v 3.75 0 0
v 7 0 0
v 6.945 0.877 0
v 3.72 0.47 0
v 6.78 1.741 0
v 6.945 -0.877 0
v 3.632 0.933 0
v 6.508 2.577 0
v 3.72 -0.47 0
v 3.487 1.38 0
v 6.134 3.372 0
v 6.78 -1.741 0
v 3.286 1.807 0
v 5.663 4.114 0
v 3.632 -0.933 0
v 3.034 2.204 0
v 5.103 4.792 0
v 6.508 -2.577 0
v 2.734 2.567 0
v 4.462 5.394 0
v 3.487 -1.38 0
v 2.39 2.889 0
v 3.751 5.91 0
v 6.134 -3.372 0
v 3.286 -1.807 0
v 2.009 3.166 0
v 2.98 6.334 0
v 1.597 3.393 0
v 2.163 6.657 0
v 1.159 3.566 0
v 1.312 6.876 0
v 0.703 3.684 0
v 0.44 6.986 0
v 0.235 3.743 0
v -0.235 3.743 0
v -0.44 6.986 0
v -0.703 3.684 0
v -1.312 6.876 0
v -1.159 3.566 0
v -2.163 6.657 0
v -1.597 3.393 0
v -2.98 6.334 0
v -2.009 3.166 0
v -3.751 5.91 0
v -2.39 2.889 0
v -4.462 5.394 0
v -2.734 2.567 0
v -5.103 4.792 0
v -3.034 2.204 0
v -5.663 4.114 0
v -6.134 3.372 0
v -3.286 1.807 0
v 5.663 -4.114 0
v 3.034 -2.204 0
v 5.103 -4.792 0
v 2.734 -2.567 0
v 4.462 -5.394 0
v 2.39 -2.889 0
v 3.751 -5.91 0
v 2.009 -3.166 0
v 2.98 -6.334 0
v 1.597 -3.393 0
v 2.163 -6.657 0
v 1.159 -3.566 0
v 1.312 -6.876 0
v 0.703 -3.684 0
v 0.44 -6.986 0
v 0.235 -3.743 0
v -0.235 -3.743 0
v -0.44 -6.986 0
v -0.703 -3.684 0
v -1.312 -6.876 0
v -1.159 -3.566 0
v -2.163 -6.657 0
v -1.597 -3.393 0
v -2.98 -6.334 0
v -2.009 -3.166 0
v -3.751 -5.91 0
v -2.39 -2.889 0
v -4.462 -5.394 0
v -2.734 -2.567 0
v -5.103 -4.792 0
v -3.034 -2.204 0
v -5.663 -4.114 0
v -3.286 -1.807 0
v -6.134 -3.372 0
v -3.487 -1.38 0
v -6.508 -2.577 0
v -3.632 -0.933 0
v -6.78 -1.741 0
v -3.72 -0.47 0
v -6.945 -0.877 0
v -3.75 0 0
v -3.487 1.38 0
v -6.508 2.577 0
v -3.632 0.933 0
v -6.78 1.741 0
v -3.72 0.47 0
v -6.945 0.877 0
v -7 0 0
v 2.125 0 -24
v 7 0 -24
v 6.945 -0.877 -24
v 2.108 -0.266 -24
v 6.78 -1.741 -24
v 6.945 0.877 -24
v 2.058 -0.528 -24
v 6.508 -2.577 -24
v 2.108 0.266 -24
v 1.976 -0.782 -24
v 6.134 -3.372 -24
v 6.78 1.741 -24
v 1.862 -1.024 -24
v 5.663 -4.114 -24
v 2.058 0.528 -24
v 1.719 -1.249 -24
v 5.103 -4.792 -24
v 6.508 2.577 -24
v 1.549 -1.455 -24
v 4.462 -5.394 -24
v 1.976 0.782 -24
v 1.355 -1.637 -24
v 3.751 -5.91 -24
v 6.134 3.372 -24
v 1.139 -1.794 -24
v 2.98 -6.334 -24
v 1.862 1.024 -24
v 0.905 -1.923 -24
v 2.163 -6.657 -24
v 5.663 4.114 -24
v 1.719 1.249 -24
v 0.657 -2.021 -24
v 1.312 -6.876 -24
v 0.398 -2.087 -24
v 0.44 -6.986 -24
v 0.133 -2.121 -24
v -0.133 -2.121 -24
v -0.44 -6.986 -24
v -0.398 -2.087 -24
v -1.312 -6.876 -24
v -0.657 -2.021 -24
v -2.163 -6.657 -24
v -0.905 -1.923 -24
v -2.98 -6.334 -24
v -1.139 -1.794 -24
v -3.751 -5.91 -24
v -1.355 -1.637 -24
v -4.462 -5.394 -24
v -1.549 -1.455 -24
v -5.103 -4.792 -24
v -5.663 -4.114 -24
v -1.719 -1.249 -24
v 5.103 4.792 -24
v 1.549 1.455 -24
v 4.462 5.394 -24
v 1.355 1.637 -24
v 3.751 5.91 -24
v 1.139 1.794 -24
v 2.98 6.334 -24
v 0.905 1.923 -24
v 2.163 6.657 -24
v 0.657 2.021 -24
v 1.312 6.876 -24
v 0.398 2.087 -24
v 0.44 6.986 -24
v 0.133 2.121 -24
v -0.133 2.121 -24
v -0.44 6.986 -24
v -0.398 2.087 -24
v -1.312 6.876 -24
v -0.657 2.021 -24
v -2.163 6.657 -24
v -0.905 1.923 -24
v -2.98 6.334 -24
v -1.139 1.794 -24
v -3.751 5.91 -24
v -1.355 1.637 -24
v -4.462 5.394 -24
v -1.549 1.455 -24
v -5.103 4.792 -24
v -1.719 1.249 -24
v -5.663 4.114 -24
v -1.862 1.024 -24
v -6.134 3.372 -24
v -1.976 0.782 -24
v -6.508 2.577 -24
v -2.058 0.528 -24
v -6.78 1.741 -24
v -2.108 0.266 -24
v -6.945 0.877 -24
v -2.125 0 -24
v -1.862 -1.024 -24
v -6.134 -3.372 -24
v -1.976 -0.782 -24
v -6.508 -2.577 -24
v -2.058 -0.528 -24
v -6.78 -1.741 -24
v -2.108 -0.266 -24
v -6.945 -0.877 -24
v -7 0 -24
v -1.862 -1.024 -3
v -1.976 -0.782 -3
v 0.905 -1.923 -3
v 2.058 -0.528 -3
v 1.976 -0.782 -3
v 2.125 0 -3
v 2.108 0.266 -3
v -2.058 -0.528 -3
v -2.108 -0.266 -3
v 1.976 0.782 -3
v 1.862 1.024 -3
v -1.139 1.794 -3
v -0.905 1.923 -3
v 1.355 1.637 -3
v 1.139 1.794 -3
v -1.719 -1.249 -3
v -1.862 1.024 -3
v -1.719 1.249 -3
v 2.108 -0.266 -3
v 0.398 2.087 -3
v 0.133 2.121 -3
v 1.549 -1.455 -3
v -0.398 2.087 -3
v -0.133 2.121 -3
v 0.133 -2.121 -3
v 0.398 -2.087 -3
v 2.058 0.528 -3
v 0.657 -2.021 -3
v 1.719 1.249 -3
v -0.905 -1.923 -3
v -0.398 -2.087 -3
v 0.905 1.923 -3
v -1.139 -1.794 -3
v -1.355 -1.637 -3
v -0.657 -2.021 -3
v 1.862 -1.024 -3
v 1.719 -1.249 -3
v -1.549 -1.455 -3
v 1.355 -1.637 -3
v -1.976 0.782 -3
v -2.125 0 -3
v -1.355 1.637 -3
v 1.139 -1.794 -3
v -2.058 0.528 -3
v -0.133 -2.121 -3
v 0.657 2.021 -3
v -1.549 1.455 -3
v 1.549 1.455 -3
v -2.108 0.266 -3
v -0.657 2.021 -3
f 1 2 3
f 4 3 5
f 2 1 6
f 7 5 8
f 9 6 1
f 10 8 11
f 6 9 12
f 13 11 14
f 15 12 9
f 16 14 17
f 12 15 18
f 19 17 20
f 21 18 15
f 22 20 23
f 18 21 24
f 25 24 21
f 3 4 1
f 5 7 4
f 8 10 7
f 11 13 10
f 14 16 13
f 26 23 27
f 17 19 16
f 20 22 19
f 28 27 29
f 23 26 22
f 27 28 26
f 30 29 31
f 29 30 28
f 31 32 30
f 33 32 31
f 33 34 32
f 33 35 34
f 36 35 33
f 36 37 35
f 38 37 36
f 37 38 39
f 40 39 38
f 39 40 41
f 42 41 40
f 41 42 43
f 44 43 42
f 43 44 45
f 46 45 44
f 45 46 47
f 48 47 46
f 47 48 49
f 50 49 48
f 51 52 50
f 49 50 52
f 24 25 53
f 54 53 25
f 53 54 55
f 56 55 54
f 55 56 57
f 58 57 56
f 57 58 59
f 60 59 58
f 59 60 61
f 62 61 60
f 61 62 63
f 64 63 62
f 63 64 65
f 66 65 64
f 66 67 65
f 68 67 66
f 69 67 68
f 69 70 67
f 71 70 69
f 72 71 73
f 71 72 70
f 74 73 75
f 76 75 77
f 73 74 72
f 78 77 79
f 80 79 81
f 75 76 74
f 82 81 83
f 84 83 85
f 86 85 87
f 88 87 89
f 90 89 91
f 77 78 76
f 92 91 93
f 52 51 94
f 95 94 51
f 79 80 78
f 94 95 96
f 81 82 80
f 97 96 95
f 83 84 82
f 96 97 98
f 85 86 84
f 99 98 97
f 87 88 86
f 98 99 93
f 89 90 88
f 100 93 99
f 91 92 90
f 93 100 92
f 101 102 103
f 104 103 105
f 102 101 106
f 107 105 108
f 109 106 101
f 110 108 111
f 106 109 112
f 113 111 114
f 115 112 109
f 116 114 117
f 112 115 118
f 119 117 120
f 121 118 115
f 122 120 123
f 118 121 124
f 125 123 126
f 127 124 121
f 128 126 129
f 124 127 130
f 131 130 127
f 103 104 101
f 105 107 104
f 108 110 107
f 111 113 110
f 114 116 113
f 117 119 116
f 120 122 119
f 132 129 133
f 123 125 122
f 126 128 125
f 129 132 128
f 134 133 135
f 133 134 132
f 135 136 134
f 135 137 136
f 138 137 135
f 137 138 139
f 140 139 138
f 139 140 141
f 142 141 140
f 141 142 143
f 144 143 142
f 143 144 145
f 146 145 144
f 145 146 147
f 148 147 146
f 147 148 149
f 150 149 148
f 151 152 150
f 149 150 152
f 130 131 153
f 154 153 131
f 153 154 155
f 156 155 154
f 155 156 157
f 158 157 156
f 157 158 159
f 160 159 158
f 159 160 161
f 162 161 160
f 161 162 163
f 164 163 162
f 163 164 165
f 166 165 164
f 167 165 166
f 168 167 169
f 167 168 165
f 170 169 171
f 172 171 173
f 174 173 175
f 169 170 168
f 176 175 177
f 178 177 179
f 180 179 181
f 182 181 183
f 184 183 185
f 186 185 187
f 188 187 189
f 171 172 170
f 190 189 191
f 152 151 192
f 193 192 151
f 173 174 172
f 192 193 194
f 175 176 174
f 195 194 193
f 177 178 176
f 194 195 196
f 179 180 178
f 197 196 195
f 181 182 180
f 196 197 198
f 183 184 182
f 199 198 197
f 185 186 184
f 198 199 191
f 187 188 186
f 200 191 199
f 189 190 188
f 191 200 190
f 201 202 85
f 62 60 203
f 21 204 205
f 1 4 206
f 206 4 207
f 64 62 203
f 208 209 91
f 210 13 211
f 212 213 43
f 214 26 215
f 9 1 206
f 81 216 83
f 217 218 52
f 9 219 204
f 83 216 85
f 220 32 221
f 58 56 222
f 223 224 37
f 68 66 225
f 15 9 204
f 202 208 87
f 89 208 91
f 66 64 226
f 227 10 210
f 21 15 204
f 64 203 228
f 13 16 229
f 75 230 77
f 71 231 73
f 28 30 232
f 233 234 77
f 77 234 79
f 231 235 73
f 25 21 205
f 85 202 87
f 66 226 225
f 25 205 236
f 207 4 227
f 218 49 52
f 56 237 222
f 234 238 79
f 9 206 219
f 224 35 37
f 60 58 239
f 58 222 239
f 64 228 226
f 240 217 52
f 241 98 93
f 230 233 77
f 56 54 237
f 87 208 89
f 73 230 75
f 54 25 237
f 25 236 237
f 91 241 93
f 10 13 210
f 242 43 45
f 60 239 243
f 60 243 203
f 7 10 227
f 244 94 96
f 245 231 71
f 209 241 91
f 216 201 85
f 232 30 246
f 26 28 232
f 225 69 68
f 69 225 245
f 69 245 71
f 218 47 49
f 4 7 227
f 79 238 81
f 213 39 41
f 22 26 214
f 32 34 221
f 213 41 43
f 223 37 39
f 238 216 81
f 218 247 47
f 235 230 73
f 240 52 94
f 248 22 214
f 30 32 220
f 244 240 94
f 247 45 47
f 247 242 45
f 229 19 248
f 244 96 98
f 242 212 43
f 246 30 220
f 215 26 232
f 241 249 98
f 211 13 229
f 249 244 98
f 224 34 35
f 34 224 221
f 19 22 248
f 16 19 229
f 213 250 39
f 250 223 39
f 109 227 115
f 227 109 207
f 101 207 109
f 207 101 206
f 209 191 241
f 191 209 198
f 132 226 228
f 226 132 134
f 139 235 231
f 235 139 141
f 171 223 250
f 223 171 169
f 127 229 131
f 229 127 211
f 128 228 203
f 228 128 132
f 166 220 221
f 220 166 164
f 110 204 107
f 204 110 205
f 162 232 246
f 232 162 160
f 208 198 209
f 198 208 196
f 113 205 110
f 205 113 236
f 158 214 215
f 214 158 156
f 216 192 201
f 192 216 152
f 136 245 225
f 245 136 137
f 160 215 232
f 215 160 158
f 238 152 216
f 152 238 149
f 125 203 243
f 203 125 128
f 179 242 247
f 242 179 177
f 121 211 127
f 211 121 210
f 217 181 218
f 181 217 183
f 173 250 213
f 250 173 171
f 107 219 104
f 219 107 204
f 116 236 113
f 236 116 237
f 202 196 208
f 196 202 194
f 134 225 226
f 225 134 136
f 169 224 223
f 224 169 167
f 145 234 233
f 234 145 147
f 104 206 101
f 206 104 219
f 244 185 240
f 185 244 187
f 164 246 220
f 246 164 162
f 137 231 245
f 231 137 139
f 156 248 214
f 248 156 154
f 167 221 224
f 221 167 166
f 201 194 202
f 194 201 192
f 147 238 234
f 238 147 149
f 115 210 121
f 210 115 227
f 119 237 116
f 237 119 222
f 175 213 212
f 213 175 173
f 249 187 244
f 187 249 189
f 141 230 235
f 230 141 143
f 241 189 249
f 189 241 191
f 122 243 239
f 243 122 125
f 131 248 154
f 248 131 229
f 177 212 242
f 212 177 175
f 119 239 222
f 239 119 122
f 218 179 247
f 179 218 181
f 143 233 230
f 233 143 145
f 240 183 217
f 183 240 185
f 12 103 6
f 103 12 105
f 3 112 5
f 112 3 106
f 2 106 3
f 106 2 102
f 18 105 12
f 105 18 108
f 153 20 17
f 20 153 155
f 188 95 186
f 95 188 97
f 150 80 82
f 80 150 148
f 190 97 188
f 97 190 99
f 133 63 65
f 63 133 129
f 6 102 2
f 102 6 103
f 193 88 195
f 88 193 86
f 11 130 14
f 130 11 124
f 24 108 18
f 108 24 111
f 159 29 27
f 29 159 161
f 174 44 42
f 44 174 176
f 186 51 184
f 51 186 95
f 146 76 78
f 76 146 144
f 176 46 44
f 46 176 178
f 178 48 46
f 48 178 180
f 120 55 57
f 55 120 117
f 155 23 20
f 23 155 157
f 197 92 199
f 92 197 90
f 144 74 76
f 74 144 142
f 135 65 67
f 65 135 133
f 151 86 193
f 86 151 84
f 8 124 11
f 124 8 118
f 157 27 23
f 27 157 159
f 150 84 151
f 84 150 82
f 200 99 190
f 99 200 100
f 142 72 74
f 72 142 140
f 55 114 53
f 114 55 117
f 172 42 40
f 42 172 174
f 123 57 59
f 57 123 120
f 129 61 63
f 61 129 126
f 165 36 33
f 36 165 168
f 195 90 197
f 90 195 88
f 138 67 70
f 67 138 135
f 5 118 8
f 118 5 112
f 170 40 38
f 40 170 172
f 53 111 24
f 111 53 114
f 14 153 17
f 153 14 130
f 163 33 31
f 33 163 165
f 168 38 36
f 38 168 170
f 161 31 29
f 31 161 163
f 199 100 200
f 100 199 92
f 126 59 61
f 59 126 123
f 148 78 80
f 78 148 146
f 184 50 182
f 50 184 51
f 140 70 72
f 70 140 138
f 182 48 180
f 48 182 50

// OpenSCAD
$fn = 50;


difference() {
	union() {
		translate(v = [0, 0, -24.0000000000]) {
			cylinder(h = 24, r = 7.0000000000);
		}
		cylinder(h = 0, r = 17.0000000000);
	}
	union() {
		translate(v = [0, 0, 0]) {
			rotate(a = [0, 0, 0]) {
				difference() {
					union() {
						#translate(v = [0, 0, -24.0000000000]) {
							cylinder(h = 24, r = 2.0000000000);
						}
						#translate(v = [0, 0, -3]) {
							cylinder(h = 3, r = 7.0000000000, r1 = 2.1250000000, r2 = 3.7500000000);
						}
						#translate(v = [0, 0, -24.0000000000]) {
							cylinder(h = 24, r = 2.1250000000);
						}
						#translate(v = [0, 0, -24.0000000000]) {
							cylinder(h = 24, r = 2.0000000000);
						}
					}
					union();
				}
			}
		}
	}
}
